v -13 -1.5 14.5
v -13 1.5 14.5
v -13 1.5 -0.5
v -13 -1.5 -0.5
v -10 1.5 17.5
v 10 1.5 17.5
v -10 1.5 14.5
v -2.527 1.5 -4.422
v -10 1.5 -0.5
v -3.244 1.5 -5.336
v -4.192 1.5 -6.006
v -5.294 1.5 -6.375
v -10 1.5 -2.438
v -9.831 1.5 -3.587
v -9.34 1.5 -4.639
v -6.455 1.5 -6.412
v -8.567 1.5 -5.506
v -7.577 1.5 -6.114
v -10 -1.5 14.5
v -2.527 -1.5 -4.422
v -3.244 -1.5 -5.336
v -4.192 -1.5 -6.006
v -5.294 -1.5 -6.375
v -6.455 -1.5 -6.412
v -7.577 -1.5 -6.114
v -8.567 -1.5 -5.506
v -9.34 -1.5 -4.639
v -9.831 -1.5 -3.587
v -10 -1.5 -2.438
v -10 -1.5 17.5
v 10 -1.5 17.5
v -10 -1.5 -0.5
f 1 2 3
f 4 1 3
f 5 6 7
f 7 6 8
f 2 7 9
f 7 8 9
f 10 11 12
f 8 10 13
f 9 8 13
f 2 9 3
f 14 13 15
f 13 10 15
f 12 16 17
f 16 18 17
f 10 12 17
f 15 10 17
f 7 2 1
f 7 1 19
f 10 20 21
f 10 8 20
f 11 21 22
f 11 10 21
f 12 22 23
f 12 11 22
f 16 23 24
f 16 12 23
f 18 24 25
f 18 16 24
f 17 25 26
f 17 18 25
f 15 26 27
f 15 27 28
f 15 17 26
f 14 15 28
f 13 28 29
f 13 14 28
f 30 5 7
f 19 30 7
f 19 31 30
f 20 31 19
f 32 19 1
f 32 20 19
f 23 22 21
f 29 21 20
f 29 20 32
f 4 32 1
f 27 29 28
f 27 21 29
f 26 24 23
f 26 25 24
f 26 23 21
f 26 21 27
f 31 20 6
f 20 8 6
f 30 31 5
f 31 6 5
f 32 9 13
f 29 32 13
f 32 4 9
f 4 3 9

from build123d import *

# Parameters (mm, degrees)
BOSS_EXTRUDE1_DEPTH = 1.5
SKETCH2_W           = 3
SKETCH2_H           = 15
BOSS_EXTRUDE2_DEPTH = 1.5
FILLET1_R           = 4


with BuildPart() as part:
    # Sketch1 → Boss-Extrude1 (new, symmetric)
    with BuildSketch(Plane(origin=(0, 0, 0), x_dir=(1, 0, 0), z_dir=(0, 1, 0))):
        Polygon((-10, 17.5), (10, -17.5), (-10, -17.5), align=None)
    extrude(amount=BOSS_EXTRUDE1_DEPTH, both=True)

    # Sketch2 → Boss-Extrude2 (add, symmetric)
    with BuildSketch(Plane(origin=(0, 0, 0), x_dir=(1, 0, 0), z_dir=(0, 1, 0))):
        with Locations((-11.5, -7)):
            Rectangle(SKETCH2_W, SKETCH2_H)
    extrude(amount=BOSS_EXTRUDE2_DEPTH, both=True)

    # Fillet1
    fillet1_edges = [part.edges().sort_by_distance(p)[0] for p in [
        (-10, 0, -17.5),
    ]]
    fillet(fillet1_edges, radius=FILLET1_R)


solid = part.part
